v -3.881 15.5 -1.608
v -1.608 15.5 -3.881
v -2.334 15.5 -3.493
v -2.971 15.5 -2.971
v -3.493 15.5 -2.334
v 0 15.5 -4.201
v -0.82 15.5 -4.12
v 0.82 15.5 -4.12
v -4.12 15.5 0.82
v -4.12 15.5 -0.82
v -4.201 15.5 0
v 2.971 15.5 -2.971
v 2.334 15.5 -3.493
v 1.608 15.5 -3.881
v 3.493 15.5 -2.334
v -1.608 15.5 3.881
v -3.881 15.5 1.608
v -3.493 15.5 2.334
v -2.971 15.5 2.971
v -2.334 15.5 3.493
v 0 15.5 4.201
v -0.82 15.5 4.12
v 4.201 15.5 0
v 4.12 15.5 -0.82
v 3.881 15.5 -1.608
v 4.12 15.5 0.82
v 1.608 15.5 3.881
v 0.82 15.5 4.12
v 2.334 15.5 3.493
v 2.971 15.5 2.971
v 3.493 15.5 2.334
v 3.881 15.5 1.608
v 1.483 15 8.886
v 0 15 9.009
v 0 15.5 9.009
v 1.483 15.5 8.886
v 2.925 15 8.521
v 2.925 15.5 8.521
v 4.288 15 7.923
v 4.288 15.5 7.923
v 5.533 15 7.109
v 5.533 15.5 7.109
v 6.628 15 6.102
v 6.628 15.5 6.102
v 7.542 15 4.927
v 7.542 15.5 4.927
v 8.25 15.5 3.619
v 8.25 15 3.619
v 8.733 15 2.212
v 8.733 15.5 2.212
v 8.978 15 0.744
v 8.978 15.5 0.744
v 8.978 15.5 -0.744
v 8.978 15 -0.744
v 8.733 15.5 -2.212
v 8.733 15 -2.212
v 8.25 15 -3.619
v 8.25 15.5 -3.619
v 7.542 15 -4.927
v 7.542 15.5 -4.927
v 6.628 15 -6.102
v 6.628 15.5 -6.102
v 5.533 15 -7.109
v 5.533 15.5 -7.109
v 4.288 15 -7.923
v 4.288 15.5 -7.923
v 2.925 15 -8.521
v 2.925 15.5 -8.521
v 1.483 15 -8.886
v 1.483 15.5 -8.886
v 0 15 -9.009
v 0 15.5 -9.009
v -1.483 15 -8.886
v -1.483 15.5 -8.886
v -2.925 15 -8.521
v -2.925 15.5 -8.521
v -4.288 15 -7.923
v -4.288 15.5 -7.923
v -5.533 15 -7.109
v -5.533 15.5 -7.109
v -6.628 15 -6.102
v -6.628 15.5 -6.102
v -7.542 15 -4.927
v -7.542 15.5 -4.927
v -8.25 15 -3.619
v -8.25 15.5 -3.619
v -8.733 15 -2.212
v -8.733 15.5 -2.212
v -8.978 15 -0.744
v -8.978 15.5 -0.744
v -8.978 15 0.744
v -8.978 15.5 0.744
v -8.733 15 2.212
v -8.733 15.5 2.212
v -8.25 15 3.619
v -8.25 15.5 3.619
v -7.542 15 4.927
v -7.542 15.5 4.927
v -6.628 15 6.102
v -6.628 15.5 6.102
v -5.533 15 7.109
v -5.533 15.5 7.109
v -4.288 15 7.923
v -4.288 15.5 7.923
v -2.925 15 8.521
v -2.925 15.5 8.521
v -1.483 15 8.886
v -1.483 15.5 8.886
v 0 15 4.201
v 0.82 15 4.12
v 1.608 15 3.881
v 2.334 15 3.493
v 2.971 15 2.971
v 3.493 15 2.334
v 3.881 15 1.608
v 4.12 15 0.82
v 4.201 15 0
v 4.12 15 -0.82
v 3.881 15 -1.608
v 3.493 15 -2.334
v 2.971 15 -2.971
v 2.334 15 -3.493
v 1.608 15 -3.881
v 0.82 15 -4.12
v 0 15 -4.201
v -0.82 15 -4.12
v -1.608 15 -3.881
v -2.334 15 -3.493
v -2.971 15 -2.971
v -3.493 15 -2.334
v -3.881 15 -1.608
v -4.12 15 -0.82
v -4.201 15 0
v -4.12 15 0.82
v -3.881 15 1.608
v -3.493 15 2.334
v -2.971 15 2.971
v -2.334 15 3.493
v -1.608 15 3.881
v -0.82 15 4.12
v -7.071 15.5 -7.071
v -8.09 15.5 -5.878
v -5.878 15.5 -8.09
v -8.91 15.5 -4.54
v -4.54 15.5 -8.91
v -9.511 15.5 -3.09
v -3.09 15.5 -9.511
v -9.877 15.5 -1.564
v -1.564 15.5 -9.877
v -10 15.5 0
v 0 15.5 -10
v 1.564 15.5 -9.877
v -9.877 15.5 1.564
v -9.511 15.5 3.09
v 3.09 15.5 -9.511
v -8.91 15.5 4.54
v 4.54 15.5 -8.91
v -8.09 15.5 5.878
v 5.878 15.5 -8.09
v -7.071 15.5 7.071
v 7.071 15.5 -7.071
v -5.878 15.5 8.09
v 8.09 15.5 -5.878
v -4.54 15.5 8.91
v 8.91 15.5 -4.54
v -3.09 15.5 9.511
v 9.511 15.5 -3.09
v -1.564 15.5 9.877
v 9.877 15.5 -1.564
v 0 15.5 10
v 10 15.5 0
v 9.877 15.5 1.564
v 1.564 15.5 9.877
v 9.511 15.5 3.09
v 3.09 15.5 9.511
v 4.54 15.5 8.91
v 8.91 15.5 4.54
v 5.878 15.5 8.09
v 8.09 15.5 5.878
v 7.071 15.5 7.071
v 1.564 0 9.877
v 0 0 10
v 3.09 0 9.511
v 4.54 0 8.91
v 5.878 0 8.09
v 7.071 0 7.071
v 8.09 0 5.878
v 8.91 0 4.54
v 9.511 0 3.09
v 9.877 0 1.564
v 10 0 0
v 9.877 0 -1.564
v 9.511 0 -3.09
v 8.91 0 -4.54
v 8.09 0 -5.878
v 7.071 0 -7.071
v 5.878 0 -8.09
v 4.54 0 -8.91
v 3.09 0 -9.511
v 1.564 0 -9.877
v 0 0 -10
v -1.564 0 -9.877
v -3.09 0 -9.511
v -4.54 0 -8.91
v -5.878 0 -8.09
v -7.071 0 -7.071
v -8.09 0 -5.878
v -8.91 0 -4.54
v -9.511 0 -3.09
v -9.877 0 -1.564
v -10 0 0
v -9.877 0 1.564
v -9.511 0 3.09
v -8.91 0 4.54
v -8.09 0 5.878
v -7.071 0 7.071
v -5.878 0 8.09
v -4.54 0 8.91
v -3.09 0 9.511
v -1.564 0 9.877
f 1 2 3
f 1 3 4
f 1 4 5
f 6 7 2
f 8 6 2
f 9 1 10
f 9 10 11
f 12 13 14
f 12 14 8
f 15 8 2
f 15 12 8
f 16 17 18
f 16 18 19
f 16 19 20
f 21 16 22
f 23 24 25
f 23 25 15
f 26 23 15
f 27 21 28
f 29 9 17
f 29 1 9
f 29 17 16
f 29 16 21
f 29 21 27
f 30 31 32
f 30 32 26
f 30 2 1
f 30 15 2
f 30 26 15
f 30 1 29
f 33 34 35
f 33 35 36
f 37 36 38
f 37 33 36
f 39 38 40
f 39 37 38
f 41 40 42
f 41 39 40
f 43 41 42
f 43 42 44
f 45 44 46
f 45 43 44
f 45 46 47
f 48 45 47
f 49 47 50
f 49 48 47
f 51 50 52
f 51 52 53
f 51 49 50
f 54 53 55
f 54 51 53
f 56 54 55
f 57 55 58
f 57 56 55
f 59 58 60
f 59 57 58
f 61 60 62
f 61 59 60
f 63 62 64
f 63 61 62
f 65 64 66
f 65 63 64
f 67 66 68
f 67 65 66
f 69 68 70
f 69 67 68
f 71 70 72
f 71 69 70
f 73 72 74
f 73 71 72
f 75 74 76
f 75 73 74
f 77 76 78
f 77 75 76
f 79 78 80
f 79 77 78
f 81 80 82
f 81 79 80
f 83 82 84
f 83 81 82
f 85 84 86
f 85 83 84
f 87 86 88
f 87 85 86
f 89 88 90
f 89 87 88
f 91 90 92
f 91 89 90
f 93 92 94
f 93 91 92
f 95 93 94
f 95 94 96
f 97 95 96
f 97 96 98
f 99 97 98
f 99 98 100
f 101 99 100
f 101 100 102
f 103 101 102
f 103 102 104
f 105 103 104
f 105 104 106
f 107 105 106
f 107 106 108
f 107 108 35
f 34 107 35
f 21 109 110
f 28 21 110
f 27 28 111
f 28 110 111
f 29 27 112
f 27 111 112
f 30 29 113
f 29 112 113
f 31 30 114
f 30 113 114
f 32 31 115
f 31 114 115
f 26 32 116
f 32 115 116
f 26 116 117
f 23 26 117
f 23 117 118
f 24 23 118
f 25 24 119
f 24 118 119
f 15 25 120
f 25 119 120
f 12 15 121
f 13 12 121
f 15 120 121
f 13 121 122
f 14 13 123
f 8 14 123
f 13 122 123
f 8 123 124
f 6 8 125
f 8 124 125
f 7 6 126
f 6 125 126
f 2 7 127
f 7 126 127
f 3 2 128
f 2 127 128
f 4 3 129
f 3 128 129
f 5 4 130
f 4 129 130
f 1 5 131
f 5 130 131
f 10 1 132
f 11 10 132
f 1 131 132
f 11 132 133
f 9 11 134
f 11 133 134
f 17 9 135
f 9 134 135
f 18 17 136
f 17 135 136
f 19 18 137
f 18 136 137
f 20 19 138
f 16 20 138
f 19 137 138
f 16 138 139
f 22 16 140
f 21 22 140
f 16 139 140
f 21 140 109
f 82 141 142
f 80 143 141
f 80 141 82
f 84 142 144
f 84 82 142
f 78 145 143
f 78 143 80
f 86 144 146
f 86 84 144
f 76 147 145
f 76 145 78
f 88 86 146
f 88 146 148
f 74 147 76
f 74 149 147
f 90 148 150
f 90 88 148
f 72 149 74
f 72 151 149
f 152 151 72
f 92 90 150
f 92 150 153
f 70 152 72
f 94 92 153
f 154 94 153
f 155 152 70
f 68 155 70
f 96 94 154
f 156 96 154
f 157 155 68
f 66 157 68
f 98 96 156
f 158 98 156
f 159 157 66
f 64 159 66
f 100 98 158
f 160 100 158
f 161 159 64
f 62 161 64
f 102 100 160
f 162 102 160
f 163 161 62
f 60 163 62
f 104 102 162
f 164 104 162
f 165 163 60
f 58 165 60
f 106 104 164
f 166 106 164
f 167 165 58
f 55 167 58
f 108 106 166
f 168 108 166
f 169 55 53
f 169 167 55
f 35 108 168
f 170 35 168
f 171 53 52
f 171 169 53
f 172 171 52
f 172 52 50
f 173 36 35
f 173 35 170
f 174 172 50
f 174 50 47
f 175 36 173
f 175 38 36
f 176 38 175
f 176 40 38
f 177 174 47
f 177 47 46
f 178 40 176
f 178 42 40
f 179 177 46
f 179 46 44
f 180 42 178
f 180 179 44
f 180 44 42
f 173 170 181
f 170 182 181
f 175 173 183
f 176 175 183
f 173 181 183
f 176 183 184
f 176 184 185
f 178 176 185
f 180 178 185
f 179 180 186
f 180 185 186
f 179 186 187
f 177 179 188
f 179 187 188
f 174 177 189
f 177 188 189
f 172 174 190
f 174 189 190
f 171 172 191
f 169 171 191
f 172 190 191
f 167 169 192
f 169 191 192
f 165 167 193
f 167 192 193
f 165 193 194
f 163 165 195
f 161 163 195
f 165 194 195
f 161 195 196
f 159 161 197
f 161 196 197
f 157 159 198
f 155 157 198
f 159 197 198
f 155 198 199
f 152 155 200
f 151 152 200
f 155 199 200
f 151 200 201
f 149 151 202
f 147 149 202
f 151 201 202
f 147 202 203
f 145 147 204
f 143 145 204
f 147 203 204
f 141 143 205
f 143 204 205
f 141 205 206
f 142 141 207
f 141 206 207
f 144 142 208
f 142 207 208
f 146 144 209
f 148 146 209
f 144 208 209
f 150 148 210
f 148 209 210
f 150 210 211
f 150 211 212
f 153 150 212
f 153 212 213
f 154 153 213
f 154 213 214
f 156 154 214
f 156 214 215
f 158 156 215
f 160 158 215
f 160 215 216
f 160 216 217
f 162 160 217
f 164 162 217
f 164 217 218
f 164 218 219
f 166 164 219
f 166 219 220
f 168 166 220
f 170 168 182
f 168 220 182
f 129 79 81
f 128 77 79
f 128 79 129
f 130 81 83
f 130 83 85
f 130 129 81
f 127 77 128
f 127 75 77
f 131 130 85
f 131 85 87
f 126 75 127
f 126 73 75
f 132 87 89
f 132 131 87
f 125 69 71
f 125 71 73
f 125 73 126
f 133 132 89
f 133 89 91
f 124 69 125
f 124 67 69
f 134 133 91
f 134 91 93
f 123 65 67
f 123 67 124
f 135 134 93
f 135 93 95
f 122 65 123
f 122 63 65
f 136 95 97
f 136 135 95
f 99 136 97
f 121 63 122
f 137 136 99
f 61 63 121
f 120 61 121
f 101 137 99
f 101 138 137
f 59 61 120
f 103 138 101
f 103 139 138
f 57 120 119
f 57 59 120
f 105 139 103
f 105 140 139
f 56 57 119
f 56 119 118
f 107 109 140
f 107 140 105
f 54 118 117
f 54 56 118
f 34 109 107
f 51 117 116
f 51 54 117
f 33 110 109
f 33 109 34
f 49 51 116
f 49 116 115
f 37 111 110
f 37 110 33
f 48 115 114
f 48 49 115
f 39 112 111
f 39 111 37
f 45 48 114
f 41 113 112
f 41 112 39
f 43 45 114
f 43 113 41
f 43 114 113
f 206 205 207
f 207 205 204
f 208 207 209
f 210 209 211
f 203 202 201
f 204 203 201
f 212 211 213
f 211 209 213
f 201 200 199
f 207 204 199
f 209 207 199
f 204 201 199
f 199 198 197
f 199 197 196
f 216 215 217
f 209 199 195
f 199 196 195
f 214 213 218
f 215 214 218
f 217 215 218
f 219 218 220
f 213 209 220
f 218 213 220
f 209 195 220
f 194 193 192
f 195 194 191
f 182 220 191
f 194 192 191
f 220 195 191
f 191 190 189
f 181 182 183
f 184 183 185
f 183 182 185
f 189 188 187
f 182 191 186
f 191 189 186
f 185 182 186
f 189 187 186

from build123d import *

# Parameters (mm, degrees)
SKETCH1_R           = 10
BOSS_EXTRUDE1_DEPTH = 15
SKETCH2_R           = 10
SKETCH2_R_2         = 9.008877903
BOSS_EXTRUDE2_DEPTH = 0.5
SKETCH3_R           = 4.201144216
BOSS_EXTRUDE3_DEPTH = 0.5


with BuildPart() as part:
    # Sketch1 → Boss-Extrude1 (new body)
    with BuildSketch(Plane(origin=(0, 0, 0), x_dir=(1, 0, 0), z_dir=(0, 1, 0))):
        with Locations(Location((0, 0, 0), (0, 0, 270))):
            Circle(SKETCH1_R)
    extrude(amount=BOSS_EXTRUDE1_DEPTH)

    # Sketch2 → Boss-Extrude2 (add)
    with BuildSketch(Plane(origin=(0, 15, 0), x_dir=(1, 0, 0), z_dir=(0, 1, 0))):
        with Locations(Location((0, 0, 0), (0, 0, 270))):
            Circle(SKETCH2_R)
        with Locations(Location((0, 0, 0), (0, 0, 270))):
            Circle(SKETCH2_R_2, mode=Mode.SUBTRACT)
    extrude(amount=BOSS_EXTRUDE2_DEPTH)

    # Sketch3 → Boss-Extrude3 (add)
    with BuildSketch(Plane(origin=(0, 15, 0), x_dir=(1, 0, 0), z_dir=(0, 1, 0))):
        with Locations(Location((0, 0, 0), (0, 0, 270))):
            Circle(SKETCH3_R)
    extrude(amount=BOSS_EXTRUDE3_DEPTH)


solid = part.part
